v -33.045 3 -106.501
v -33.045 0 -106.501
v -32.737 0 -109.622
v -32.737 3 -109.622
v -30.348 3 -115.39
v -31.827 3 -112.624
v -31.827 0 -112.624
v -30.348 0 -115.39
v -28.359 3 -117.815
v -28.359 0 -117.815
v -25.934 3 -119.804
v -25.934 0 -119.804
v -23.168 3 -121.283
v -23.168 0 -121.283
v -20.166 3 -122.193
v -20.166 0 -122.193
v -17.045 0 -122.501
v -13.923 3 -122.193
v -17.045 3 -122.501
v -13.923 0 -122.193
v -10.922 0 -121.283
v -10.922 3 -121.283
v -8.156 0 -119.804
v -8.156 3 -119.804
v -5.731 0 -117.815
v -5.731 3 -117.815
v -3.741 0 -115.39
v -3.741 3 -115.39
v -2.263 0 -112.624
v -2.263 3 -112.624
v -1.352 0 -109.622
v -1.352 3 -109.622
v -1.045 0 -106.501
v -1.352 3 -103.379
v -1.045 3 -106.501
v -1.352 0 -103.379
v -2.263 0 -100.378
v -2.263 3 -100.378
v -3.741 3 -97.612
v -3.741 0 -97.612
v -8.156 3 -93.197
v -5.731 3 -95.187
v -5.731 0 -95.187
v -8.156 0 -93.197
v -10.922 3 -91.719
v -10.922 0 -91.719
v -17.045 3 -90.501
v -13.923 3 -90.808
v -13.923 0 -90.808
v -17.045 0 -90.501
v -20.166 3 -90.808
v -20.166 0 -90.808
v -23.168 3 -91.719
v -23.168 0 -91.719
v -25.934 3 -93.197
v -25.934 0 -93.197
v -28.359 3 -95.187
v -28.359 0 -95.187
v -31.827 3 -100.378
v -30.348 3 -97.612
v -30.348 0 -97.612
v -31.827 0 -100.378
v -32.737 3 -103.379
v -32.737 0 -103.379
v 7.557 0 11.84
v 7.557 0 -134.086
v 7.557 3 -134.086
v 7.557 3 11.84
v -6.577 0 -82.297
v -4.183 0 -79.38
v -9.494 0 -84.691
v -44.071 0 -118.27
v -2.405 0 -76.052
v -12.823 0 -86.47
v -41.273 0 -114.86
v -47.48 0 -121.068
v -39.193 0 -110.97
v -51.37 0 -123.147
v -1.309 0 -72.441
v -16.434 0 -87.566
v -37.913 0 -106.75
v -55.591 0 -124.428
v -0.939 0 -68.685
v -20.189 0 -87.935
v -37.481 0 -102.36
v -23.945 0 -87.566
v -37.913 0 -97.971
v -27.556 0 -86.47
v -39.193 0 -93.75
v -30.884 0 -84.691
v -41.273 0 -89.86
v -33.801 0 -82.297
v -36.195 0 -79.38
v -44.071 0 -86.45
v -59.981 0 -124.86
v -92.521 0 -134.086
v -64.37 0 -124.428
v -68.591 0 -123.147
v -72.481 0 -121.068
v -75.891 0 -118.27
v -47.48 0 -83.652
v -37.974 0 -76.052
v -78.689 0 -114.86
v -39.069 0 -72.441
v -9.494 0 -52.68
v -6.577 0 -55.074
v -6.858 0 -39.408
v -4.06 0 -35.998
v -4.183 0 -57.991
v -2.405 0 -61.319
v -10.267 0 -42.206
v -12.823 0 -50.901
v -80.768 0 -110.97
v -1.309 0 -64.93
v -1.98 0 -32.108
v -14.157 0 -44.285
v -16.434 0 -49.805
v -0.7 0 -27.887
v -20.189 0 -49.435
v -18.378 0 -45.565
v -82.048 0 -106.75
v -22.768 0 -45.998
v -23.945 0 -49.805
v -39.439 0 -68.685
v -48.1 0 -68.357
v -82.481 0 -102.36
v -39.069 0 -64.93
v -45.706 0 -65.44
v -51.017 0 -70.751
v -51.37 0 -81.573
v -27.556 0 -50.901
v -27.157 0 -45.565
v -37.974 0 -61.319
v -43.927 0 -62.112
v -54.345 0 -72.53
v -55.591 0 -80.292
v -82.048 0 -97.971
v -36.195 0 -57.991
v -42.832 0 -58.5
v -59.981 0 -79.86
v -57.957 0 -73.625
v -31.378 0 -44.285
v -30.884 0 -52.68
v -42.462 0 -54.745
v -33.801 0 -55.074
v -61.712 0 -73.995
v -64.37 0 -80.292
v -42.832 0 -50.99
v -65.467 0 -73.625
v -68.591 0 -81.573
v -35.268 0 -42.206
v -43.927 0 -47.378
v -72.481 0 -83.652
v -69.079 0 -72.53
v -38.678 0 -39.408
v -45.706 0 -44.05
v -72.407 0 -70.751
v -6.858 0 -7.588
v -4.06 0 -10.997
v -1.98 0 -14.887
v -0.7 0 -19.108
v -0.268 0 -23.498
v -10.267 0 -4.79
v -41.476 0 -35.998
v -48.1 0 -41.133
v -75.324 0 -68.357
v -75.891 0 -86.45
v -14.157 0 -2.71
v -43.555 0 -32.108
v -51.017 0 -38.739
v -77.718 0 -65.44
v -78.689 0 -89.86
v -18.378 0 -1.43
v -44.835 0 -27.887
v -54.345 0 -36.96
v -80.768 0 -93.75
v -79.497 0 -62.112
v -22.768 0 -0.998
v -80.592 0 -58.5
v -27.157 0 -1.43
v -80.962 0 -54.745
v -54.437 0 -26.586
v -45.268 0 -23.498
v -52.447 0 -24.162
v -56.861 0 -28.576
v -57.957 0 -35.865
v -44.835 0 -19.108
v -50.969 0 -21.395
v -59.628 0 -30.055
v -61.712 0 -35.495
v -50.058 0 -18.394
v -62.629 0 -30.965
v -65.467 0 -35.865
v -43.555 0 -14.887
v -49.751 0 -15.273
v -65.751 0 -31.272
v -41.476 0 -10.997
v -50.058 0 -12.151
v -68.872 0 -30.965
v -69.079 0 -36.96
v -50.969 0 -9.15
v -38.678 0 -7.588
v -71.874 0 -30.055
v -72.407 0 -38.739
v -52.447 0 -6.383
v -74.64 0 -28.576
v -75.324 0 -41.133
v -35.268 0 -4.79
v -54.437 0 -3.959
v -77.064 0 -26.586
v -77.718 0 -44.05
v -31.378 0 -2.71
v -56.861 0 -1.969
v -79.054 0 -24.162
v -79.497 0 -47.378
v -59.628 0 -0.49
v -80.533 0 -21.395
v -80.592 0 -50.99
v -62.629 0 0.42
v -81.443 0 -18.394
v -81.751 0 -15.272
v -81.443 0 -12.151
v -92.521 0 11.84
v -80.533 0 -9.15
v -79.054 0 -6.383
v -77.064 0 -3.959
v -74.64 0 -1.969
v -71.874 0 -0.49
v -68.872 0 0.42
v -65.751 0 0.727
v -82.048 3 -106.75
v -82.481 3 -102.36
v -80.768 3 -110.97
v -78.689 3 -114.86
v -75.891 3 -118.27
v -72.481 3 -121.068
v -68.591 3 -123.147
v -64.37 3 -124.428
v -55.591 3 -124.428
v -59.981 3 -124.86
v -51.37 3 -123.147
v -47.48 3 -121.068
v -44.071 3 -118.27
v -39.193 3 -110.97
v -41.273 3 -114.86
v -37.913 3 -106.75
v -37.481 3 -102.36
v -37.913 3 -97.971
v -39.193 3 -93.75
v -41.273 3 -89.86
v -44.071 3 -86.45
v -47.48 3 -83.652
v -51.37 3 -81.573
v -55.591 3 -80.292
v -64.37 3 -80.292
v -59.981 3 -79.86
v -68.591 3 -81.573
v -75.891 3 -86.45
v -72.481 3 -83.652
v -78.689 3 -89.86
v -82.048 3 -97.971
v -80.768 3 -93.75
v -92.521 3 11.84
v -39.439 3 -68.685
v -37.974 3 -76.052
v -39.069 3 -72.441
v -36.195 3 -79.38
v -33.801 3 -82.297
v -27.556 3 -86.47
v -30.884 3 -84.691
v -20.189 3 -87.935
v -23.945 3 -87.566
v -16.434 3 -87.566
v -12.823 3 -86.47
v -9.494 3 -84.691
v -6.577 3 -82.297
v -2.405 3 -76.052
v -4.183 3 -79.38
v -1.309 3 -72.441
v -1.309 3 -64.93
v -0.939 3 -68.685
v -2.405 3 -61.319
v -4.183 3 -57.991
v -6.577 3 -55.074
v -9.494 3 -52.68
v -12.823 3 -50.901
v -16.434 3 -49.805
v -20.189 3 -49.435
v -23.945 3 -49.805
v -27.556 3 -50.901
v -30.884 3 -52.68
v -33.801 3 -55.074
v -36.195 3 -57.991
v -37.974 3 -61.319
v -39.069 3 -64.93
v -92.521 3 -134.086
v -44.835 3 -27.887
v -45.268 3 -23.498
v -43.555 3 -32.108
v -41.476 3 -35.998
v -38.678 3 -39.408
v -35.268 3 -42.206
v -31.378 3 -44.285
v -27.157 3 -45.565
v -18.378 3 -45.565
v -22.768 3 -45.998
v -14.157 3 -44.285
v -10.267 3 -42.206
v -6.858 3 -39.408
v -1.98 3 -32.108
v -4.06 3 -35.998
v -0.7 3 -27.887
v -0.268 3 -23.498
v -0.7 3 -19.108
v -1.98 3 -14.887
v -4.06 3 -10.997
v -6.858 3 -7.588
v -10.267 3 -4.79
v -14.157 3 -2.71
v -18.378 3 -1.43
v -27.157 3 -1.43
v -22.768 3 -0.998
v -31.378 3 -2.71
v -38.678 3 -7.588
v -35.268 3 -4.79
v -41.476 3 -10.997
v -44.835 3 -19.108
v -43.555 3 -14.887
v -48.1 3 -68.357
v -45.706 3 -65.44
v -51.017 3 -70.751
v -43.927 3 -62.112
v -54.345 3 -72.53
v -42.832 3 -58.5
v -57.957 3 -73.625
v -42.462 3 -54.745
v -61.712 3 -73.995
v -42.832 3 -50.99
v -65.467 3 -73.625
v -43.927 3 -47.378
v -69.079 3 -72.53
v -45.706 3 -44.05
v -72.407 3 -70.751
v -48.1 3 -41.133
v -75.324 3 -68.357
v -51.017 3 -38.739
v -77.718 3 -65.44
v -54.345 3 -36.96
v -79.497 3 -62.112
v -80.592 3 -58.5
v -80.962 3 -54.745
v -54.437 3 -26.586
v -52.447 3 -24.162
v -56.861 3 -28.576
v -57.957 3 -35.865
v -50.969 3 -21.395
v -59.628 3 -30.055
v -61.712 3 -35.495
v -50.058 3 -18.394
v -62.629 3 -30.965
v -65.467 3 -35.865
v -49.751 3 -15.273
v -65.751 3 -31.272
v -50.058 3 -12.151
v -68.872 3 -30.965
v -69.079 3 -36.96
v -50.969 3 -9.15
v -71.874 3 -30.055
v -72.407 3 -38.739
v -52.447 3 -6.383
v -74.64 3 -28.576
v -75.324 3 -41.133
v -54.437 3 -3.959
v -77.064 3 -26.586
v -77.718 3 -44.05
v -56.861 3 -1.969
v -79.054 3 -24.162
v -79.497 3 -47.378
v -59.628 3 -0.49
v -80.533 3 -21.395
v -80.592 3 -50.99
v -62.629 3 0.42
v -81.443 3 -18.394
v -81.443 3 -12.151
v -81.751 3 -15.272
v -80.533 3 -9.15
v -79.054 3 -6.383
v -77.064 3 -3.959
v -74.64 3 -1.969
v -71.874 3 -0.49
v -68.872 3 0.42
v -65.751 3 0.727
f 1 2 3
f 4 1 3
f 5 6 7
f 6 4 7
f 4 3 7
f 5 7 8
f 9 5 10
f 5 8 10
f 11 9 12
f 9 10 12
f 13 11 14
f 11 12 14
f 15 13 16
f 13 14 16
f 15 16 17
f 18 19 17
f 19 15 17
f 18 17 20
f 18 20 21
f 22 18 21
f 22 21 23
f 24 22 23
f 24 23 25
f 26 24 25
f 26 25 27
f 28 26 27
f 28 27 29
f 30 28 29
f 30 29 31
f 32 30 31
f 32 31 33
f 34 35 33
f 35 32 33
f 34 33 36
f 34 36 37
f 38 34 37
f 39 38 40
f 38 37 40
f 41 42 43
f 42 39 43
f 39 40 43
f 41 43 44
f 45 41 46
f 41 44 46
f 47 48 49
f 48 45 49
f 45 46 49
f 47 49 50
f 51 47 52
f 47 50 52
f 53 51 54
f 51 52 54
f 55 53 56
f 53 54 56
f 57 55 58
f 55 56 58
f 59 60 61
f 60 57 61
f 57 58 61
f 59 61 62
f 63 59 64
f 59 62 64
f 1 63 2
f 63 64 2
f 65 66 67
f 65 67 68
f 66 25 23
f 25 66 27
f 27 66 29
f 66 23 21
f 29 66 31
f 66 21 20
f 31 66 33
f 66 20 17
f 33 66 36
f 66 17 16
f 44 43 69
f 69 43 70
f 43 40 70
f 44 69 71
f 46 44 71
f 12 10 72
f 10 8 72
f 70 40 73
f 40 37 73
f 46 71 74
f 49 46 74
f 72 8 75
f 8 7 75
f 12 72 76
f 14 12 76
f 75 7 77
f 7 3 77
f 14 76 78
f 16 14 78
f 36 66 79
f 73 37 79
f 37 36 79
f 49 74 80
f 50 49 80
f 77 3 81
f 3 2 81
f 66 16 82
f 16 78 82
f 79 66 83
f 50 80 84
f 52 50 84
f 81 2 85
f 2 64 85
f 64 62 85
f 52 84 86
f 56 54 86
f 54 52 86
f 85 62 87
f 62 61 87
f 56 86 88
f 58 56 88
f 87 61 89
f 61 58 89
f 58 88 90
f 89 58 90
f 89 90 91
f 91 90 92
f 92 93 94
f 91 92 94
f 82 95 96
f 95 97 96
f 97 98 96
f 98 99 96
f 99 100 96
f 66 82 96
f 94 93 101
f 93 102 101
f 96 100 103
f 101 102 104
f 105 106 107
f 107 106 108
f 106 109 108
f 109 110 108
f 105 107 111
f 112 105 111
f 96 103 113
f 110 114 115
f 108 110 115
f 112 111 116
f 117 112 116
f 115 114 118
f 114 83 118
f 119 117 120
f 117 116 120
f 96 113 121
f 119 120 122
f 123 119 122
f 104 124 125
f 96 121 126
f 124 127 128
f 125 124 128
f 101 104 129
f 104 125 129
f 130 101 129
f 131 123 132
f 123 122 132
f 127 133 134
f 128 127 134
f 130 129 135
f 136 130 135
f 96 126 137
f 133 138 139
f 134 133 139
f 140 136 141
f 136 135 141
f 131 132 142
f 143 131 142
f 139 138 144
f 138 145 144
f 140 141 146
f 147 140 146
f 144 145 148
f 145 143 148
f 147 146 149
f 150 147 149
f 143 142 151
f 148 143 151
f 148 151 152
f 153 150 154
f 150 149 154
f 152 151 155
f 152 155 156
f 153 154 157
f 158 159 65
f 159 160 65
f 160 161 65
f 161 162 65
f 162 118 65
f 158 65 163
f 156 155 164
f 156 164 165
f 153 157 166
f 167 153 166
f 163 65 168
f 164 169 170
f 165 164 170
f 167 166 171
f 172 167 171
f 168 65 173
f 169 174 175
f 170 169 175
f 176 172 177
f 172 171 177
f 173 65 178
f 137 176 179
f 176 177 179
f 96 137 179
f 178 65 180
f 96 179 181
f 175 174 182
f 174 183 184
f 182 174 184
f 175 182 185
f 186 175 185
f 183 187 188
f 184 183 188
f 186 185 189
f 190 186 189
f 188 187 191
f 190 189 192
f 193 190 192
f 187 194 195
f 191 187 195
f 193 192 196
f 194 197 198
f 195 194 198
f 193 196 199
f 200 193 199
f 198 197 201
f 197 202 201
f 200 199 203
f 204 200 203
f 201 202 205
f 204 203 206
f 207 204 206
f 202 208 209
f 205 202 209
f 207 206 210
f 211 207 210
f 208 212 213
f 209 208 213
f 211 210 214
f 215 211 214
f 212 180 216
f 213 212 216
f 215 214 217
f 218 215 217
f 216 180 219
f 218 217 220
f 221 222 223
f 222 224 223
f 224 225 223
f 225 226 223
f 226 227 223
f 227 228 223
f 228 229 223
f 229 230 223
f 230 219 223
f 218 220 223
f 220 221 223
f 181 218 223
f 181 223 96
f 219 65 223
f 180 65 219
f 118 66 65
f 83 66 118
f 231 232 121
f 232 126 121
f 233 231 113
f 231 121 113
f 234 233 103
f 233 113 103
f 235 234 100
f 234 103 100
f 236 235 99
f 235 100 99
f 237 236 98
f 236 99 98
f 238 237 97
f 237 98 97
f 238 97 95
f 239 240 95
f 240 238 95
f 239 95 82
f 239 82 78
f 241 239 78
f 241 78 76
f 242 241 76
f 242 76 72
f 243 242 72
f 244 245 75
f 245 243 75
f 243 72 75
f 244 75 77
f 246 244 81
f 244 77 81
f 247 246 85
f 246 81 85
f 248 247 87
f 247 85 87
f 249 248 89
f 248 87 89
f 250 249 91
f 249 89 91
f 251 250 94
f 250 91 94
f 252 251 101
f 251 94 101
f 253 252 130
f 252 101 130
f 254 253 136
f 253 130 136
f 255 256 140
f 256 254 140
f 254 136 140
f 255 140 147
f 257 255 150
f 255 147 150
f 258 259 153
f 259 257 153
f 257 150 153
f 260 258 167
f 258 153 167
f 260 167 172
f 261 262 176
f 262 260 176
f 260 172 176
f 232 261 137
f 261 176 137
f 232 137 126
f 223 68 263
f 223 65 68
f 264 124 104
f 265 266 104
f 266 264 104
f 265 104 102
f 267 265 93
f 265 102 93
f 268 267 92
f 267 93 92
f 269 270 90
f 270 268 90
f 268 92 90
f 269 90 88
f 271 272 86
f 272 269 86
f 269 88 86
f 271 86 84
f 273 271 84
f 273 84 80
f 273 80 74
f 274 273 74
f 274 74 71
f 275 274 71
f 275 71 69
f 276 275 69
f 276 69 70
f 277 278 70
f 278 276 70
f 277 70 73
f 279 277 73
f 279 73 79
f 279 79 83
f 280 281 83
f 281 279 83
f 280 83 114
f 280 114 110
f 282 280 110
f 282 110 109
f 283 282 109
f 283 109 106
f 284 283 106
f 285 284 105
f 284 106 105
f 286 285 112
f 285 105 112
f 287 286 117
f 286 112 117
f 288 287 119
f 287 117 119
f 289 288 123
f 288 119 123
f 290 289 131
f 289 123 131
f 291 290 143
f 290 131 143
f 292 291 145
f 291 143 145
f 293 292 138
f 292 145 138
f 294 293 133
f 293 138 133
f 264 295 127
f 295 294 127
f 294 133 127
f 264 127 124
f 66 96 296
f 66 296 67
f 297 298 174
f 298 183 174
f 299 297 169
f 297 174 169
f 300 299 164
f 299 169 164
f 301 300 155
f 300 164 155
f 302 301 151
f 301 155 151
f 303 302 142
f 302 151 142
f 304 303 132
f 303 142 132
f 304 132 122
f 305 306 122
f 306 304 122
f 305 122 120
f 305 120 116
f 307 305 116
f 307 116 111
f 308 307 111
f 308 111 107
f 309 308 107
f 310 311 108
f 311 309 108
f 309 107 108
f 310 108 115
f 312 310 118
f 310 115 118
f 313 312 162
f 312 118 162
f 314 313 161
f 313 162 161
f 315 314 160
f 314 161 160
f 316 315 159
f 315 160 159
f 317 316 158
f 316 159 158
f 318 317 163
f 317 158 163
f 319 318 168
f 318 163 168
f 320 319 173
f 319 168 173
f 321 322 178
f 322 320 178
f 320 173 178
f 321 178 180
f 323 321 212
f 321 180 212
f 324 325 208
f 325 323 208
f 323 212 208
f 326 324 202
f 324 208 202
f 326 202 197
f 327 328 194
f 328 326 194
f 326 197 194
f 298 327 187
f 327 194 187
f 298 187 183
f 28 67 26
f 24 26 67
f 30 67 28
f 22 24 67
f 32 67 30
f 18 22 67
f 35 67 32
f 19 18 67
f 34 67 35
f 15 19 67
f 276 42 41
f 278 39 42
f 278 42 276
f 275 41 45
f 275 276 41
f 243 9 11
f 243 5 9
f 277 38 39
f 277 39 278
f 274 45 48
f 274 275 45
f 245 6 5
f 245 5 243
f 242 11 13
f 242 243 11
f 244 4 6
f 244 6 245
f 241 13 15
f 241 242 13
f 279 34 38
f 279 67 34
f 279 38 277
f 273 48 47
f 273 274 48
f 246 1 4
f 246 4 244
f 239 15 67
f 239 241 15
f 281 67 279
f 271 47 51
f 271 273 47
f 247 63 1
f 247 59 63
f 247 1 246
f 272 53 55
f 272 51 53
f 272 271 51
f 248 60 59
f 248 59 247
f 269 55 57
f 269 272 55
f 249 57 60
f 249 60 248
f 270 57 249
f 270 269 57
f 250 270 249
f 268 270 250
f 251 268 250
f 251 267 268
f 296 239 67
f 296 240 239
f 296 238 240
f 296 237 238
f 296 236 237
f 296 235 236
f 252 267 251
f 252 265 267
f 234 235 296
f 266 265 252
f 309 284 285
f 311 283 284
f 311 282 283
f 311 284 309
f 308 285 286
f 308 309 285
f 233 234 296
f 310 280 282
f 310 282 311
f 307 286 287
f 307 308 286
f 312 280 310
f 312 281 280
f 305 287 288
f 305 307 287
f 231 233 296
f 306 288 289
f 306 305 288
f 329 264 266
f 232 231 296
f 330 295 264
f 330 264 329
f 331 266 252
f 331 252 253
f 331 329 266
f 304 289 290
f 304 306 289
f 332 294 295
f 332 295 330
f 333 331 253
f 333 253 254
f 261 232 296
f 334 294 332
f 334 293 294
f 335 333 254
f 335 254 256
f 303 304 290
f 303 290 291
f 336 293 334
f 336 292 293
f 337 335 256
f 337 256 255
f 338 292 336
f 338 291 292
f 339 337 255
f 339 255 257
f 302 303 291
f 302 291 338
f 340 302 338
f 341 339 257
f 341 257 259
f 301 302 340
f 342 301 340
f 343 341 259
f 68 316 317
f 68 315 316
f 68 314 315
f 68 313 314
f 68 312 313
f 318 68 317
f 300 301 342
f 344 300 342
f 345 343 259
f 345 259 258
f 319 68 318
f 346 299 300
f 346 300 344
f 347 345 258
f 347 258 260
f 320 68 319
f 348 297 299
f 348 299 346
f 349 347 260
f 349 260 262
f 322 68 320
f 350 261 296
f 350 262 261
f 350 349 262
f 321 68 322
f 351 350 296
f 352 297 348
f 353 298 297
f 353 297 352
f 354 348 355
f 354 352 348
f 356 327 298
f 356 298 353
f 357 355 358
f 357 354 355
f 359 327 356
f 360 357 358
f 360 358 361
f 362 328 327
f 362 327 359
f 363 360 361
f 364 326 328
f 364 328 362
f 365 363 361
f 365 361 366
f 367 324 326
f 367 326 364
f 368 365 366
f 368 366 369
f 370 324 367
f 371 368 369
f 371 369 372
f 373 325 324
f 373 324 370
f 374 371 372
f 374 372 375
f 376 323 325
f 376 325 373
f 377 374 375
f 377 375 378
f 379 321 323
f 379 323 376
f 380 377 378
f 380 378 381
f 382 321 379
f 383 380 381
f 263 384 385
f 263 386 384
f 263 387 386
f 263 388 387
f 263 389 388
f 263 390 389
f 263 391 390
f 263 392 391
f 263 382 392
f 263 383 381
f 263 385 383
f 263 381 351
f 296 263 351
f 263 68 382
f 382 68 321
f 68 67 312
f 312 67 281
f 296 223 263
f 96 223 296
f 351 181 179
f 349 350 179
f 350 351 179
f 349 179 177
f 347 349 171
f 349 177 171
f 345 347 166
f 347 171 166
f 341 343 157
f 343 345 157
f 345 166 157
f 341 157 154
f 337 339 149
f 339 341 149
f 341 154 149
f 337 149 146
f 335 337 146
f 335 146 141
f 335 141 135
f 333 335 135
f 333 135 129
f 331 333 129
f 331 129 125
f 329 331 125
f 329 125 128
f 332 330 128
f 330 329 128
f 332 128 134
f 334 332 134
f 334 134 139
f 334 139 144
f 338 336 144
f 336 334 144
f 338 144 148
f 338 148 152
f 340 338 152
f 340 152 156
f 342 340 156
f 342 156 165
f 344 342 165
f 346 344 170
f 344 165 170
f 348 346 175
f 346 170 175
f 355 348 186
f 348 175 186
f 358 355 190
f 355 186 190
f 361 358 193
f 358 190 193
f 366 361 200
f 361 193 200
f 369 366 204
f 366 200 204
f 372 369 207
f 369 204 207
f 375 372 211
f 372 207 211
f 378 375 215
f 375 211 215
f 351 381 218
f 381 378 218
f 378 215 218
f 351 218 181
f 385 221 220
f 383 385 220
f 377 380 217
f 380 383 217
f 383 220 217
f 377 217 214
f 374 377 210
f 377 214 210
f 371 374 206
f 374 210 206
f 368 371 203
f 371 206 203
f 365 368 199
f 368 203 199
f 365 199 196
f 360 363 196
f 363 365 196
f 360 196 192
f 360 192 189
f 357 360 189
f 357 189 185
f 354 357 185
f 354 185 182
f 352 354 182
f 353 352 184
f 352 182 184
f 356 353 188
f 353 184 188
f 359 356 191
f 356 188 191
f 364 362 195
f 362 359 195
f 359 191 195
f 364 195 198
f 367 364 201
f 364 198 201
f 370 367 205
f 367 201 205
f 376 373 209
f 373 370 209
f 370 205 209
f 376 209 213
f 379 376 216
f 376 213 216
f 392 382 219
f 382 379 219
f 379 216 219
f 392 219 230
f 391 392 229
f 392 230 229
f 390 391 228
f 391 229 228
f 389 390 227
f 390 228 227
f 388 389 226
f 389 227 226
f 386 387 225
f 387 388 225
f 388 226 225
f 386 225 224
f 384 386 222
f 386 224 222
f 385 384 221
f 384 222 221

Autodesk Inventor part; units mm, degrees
ref_plane "YZ Plane" through (0, 0, 0) normal (1, 0, 0) x (0, 1, 0)
ref_plane "XZ Plane" through (0, 0, 0) normal (0, 1, 0) x (-1, 0, 0)
ref_plane "XY Plane" through (0, 0, 0) normal (0, 0, 1) x (1, 0, 0)
sketch "Sketch1" plane through (0, 0, 0) normal (0, 1, 0) x (-1, 0, 0)
  circle A0 centre (59.9806, -102.3601) radius 22.5
  circle A1 centre (61.712, -54.745) radius 19.25
  circle A2 centre (65.7506, -15.2725) radius 16
  circle A3 centre (22.7676, -23.4976) radius 22.5
  circle A4 centre (20.1892, -68.6854) radius 19.25
  circle A5 centre (17.0449, -106.5008) radius 16
  line L0 (-7.557, 11.8403) -> (92.5214, 11.8403)
  line L1 (92.5214, 11.8403) -> (92.5214, -134.0855)
  line L2 (92.5214, -134.0855) -> (-7.557, -134.0855)
  line L3 (-7.557, -134.0855) -> (-7.557, 11.8403)
  point P0 (0, 0)
extrude "Extrusion1" add sketch "Sketch1" along normal blind 3
properties part number "Center"
